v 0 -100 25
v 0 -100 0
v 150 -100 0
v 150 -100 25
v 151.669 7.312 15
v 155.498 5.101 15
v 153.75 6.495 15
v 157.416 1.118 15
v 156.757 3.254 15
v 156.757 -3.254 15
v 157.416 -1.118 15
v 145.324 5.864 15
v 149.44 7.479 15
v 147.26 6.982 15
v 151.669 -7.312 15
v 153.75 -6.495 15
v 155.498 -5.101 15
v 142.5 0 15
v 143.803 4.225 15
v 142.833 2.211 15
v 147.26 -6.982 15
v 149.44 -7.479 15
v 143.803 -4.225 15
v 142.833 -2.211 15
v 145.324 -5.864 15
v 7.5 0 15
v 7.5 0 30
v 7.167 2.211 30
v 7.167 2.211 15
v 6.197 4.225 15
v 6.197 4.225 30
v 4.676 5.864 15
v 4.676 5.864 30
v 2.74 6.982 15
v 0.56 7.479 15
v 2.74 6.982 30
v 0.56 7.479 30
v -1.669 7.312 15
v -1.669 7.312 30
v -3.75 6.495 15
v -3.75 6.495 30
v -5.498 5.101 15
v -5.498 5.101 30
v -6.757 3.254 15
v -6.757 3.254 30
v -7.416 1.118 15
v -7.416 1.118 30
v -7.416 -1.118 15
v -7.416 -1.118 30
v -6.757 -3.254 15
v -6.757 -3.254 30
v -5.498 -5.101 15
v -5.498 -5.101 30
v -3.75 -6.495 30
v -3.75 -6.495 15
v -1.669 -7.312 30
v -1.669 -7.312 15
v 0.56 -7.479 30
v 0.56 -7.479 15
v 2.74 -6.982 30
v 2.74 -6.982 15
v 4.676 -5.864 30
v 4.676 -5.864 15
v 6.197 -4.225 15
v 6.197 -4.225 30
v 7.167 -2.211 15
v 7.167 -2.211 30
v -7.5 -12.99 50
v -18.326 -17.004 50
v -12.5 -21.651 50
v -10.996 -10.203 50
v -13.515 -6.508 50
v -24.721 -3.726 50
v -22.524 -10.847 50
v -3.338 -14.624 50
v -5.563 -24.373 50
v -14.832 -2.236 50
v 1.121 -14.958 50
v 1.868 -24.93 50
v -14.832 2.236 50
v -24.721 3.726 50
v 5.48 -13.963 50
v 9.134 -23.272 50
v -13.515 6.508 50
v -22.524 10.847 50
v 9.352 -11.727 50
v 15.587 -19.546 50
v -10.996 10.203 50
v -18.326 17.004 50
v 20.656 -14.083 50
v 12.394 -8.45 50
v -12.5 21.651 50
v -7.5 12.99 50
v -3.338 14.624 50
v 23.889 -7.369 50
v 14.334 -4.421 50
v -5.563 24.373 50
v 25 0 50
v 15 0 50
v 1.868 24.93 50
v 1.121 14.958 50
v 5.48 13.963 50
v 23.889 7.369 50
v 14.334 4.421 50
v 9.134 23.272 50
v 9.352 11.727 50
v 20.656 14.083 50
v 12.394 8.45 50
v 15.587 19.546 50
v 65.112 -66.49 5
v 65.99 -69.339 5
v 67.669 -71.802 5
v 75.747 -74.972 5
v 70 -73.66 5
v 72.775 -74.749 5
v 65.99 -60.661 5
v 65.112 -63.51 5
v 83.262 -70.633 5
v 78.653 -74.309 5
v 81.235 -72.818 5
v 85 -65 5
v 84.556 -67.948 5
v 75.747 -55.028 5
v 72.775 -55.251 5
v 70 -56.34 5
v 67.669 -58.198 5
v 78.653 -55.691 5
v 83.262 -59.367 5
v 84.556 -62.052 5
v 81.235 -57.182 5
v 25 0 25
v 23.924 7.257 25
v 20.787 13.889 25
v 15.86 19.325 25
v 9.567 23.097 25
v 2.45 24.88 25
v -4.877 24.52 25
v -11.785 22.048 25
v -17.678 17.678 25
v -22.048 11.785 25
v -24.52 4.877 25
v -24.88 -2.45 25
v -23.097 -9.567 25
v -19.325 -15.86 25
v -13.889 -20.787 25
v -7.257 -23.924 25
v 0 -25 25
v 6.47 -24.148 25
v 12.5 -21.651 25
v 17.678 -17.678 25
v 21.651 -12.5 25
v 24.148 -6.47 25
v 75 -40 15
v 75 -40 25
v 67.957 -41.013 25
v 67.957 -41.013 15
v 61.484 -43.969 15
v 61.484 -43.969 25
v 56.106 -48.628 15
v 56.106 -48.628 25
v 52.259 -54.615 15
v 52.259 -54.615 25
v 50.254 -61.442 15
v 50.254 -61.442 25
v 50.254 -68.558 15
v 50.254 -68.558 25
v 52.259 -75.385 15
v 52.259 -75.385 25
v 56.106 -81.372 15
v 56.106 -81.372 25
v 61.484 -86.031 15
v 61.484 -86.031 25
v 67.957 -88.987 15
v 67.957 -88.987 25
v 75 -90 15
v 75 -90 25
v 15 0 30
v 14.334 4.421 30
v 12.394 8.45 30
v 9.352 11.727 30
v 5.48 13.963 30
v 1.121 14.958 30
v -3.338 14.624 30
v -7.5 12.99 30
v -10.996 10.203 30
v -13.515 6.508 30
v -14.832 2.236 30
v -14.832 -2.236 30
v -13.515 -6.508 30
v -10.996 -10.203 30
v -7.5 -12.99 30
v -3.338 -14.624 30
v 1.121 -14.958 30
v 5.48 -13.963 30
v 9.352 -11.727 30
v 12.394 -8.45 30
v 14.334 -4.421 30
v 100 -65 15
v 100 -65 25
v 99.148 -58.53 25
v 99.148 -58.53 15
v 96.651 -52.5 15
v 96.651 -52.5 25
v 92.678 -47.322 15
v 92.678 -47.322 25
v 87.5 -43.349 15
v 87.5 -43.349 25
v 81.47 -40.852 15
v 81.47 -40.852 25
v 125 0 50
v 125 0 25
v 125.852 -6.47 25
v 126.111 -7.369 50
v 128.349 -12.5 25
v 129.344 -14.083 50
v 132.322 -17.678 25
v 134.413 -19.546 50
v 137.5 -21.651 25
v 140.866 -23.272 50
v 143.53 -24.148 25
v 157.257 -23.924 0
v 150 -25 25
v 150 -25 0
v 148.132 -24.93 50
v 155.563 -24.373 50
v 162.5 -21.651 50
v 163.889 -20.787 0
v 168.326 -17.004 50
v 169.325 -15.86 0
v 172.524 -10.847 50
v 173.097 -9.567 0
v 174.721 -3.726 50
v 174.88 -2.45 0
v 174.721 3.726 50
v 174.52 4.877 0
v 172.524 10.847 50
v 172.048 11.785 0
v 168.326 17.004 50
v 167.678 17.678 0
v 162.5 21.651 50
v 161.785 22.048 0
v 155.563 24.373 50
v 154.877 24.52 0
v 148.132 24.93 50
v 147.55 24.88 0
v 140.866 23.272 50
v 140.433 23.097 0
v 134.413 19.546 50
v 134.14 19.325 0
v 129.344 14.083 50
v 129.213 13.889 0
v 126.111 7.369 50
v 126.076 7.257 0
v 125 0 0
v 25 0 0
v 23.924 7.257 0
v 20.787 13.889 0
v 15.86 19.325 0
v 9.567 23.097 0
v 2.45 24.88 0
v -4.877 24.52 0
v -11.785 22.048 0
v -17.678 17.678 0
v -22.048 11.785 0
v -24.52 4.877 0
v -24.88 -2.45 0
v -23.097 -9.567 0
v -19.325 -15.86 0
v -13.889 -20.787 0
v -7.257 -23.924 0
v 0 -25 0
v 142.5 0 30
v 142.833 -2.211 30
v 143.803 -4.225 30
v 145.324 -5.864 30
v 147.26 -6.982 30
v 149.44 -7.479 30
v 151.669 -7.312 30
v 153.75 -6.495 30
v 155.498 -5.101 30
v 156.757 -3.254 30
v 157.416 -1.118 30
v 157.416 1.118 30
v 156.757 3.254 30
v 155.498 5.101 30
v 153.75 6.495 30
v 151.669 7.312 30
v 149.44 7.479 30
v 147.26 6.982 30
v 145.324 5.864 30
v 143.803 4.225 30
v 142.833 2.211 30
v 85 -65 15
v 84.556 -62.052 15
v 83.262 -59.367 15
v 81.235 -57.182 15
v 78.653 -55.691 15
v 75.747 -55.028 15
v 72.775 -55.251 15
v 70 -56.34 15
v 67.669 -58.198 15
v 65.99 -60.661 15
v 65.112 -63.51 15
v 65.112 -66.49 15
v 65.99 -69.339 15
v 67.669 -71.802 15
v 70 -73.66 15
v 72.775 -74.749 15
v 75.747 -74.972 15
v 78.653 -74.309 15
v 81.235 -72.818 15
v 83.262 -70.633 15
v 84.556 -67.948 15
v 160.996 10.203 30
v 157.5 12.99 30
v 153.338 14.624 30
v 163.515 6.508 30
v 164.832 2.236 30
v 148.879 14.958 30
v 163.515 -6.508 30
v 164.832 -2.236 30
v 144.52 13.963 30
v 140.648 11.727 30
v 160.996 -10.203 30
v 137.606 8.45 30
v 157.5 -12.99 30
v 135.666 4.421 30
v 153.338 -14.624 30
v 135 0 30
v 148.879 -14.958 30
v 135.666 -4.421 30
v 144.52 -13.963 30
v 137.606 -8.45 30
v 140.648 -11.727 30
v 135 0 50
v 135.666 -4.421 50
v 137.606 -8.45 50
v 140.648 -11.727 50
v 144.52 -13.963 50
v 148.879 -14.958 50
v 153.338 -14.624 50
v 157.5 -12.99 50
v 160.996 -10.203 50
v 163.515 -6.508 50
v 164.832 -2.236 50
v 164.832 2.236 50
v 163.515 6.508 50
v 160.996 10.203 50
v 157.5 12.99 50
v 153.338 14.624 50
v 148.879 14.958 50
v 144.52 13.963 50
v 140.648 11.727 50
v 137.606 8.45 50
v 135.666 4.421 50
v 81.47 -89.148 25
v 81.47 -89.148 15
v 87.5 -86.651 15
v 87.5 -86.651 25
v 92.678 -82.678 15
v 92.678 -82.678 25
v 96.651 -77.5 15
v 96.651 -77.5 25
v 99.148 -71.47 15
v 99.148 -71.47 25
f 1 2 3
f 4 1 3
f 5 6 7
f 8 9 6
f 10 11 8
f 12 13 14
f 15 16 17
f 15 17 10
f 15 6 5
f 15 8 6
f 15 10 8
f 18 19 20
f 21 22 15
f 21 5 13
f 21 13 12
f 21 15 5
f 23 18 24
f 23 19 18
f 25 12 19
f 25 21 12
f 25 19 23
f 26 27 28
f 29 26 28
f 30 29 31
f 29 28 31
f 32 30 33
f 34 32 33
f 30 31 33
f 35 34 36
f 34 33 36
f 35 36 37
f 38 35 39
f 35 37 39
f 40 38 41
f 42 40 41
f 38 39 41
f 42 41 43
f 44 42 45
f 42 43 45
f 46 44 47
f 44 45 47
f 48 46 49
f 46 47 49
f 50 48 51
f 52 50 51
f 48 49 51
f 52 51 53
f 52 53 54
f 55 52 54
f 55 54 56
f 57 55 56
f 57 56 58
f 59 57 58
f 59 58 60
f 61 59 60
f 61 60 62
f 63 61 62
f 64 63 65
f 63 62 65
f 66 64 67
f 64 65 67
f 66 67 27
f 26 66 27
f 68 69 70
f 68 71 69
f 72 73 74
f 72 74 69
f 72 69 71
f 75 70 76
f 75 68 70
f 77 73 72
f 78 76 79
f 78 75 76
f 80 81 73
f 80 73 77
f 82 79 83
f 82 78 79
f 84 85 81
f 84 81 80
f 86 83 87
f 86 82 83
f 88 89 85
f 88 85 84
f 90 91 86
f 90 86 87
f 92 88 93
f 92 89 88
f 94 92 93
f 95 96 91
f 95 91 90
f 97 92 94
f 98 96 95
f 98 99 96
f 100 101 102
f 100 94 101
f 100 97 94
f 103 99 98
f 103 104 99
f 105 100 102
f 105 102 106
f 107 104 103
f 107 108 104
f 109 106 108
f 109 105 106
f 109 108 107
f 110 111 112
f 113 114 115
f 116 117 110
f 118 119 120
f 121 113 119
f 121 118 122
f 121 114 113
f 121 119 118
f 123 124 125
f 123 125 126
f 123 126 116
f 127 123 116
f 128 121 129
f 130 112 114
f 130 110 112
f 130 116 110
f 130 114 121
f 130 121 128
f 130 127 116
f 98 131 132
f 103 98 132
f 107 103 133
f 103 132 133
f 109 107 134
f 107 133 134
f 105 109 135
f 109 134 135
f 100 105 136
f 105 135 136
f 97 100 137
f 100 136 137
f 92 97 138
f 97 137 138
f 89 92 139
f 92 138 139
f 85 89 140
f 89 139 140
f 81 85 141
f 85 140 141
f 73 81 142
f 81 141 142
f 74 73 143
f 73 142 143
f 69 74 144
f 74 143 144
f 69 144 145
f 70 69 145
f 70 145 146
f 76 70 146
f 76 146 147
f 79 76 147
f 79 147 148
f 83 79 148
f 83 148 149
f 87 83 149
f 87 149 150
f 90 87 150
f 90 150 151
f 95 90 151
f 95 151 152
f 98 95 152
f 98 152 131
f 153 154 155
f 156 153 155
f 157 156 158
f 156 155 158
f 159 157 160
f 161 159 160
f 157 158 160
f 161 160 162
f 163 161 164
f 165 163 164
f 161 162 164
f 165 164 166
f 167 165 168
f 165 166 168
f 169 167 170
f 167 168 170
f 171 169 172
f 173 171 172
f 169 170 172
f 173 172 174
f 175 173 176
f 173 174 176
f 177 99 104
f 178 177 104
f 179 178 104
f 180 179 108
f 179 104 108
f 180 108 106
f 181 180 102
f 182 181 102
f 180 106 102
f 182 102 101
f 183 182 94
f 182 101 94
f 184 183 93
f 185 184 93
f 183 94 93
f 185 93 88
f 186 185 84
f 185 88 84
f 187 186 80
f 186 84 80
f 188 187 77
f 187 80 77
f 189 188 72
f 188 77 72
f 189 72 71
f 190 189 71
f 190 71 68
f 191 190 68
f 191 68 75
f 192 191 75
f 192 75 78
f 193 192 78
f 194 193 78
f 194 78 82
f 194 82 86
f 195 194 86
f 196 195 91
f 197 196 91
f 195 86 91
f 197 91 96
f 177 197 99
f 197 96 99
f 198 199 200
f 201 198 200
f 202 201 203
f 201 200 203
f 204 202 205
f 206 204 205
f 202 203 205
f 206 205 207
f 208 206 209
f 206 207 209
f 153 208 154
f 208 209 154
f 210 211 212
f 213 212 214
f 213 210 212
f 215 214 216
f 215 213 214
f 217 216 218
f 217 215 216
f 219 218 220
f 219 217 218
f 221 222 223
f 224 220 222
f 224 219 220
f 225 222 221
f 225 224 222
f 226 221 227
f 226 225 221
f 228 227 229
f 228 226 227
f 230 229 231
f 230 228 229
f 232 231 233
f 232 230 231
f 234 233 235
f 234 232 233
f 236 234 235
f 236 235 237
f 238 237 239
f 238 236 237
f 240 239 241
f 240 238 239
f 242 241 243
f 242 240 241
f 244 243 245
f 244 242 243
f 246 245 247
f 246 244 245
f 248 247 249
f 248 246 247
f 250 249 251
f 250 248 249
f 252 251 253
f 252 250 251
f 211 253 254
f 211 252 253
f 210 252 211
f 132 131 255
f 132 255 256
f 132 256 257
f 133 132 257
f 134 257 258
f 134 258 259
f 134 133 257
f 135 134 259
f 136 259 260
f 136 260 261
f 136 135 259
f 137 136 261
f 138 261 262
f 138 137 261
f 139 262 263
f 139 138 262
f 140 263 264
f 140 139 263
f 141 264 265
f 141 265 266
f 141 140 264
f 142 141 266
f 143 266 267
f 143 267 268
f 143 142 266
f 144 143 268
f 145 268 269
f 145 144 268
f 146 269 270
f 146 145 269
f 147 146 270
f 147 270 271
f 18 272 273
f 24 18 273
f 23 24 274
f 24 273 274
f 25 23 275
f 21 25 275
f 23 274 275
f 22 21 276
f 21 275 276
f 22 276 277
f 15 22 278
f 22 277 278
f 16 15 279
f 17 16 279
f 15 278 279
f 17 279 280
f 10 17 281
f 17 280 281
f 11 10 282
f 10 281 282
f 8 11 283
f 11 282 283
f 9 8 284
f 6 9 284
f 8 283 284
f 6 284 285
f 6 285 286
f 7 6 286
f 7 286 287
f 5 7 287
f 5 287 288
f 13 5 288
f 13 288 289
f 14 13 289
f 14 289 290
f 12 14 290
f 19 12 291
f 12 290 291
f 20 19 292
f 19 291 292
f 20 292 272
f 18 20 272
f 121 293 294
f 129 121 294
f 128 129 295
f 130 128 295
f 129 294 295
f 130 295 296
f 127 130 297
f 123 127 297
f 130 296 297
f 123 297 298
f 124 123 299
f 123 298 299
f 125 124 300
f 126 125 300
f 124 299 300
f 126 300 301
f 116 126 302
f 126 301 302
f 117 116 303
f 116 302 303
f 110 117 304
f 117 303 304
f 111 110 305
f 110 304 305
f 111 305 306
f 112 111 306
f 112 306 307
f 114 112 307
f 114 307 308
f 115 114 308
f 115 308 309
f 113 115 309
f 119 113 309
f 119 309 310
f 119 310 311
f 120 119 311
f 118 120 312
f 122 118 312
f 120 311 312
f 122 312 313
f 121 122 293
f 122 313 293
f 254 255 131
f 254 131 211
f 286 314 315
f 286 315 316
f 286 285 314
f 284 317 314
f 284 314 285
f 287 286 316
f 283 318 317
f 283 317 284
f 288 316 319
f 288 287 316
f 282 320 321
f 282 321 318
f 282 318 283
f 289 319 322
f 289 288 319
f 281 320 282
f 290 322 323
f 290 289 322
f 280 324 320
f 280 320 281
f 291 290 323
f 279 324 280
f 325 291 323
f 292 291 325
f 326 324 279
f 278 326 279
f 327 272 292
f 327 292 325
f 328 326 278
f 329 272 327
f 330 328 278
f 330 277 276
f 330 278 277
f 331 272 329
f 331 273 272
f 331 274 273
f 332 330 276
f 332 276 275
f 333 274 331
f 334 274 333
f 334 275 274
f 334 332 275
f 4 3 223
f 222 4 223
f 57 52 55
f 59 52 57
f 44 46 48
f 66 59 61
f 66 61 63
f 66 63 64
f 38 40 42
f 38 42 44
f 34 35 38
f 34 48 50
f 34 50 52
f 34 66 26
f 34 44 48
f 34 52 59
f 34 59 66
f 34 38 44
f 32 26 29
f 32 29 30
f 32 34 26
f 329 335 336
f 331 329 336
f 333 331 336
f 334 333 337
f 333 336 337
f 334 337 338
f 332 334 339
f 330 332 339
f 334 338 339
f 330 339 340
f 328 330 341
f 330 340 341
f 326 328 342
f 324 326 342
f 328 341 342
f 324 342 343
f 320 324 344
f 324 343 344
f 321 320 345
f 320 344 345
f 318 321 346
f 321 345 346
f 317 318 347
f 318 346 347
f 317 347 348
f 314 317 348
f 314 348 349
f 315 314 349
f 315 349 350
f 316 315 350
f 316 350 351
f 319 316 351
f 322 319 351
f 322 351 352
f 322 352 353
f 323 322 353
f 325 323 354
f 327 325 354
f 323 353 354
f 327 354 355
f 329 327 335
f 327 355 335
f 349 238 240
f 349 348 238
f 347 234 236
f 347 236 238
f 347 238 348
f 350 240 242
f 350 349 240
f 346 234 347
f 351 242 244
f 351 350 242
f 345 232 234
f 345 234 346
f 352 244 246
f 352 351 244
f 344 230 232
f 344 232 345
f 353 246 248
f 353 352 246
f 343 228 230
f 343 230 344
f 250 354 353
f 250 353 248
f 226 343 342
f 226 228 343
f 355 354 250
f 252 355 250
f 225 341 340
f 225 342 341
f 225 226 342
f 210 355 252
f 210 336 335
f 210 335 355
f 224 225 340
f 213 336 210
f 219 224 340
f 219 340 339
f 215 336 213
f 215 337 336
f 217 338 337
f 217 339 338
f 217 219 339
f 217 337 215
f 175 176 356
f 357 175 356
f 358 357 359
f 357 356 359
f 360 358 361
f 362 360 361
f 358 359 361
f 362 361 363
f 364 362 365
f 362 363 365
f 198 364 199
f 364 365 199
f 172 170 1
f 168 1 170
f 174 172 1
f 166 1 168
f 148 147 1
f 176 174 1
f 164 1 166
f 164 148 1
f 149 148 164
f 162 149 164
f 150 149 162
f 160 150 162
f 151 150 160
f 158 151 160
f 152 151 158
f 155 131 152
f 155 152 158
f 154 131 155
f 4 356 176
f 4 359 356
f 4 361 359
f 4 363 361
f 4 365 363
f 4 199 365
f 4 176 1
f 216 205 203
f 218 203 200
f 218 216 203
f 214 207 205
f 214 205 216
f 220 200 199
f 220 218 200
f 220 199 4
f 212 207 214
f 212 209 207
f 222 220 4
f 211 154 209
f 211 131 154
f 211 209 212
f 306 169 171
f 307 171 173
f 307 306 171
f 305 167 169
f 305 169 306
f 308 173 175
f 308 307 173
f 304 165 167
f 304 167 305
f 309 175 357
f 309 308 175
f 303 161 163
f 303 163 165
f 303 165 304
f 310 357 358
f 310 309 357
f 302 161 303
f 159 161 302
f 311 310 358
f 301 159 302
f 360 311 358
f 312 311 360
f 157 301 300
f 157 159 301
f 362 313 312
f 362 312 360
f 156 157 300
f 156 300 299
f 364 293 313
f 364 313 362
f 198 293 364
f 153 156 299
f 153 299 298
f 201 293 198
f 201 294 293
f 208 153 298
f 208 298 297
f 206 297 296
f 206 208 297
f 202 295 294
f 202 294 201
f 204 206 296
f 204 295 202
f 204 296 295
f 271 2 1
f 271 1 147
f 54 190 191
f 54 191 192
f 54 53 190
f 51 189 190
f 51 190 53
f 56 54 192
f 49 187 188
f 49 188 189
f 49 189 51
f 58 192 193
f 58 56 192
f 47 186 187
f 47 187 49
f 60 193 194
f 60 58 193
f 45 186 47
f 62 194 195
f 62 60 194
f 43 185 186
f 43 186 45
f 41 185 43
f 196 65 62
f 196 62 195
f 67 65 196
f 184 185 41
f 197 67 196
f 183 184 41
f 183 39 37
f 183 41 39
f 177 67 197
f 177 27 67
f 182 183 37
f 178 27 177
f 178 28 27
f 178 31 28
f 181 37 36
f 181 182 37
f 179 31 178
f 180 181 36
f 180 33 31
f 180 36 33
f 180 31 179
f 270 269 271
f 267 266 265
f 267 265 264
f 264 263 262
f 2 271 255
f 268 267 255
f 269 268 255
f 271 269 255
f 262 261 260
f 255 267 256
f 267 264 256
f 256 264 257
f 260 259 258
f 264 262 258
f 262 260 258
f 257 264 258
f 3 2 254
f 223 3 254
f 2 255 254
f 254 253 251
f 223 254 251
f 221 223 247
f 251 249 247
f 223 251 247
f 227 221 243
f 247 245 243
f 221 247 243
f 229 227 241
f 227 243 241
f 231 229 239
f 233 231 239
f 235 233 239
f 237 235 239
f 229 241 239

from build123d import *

# Parameters (mm, degrees)
SKETCH_1_W          = 150
SKETCH_1_H          = 100
EXTRUDE_1_DEPTH     = 25
SKETCH_2_R          = 25
EXTRUDE_2_DEPTH     = 25
SKETCH_3_R          = 15
CUT_EXTRUDE_1_DEPTH = 20
SKETCH_4_R          = 7.5
CUT_EXTRUDE_2_DEPTH = 15
CUT_EXTRUDE_3_DEPTH = 10
SKETCH_6_R          = 10
CUT_EXTRUDE_4_DEPTH = 10


with BuildPart() as part:
    # Эскиз1 → Бобышка-Вытянуть1 (new body)
    with BuildSketch(Plane.XY):
        with Locations((75, -50)):
            Rectangle(SKETCH_1_W, SKETCH_1_H)
    extrude(amount=EXTRUDE_1_DEPTH)

    # Эскиз2 → Бобышка-Вытянуть2 (add, symmetric)
    with BuildSketch(Plane.XY.offset(25)):
        Circle(SKETCH_2_R)
        with Locations(Location((150, 0, 0), (0, 0, 180))):
            Circle(SKETCH_2_R)
    extrude(amount=EXTRUDE_2_DEPTH, both=True)

    # Эскиз3 → Вырез-Вытянуть1 (cut)
    with BuildSketch(Plane.XY.offset(50)):
        Circle(SKETCH_3_R)
        with Locations(Location((150, 0, 0), (0, 0, 180))):
            Circle(SKETCH_3_R)
    extrude(amount=-CUT_EXTRUDE_1_DEPTH, mode=Mode.SUBTRACT)

    # Эскиз4 → Вырез-Вытянуть2 (cut)
    with BuildSketch(Plane.XY.offset(30)):
        Circle(SKETCH_4_R)
        with Locations(Location((150, 0, 0), (0, 0, 180))):
            Circle(SKETCH_4_R)
    extrude(amount=-CUT_EXTRUDE_2_DEPTH, mode=Mode.SUBTRACT)

    # Эскиз5 → Вырез-Вытянуть3 (cut)
    with BuildSketch(Plane.XY.offset(25)):
        with BuildLine():
            ThreePointArc((100, -65), (92.67766953, -47.32233047), (75, -40))
            Line((75, -40), (75, -90))
            ThreePointArc((75, -90), (92.67766953, -82.67766953), (100, -65))
        make_face()
        with BuildLine():
            Line((75, -90), (75, -40))
            ThreePointArc((75, -40), (50, -65), (75, -90))
        make_face()
    extrude(amount=-CUT_EXTRUDE_3_DEPTH, mode=Mode.SUBTRACT)

    # Эскиз6 → Вырез-Вытянуть4 (cut)
    with BuildSketch(Plane.XY.offset(15)):
        with Locations((75, -65)):
            Circle(SKETCH_6_R)
    extrude(amount=-CUT_EXTRUDE_4_DEPTH, mode=Mode.SUBTRACT)


solid = part.part
